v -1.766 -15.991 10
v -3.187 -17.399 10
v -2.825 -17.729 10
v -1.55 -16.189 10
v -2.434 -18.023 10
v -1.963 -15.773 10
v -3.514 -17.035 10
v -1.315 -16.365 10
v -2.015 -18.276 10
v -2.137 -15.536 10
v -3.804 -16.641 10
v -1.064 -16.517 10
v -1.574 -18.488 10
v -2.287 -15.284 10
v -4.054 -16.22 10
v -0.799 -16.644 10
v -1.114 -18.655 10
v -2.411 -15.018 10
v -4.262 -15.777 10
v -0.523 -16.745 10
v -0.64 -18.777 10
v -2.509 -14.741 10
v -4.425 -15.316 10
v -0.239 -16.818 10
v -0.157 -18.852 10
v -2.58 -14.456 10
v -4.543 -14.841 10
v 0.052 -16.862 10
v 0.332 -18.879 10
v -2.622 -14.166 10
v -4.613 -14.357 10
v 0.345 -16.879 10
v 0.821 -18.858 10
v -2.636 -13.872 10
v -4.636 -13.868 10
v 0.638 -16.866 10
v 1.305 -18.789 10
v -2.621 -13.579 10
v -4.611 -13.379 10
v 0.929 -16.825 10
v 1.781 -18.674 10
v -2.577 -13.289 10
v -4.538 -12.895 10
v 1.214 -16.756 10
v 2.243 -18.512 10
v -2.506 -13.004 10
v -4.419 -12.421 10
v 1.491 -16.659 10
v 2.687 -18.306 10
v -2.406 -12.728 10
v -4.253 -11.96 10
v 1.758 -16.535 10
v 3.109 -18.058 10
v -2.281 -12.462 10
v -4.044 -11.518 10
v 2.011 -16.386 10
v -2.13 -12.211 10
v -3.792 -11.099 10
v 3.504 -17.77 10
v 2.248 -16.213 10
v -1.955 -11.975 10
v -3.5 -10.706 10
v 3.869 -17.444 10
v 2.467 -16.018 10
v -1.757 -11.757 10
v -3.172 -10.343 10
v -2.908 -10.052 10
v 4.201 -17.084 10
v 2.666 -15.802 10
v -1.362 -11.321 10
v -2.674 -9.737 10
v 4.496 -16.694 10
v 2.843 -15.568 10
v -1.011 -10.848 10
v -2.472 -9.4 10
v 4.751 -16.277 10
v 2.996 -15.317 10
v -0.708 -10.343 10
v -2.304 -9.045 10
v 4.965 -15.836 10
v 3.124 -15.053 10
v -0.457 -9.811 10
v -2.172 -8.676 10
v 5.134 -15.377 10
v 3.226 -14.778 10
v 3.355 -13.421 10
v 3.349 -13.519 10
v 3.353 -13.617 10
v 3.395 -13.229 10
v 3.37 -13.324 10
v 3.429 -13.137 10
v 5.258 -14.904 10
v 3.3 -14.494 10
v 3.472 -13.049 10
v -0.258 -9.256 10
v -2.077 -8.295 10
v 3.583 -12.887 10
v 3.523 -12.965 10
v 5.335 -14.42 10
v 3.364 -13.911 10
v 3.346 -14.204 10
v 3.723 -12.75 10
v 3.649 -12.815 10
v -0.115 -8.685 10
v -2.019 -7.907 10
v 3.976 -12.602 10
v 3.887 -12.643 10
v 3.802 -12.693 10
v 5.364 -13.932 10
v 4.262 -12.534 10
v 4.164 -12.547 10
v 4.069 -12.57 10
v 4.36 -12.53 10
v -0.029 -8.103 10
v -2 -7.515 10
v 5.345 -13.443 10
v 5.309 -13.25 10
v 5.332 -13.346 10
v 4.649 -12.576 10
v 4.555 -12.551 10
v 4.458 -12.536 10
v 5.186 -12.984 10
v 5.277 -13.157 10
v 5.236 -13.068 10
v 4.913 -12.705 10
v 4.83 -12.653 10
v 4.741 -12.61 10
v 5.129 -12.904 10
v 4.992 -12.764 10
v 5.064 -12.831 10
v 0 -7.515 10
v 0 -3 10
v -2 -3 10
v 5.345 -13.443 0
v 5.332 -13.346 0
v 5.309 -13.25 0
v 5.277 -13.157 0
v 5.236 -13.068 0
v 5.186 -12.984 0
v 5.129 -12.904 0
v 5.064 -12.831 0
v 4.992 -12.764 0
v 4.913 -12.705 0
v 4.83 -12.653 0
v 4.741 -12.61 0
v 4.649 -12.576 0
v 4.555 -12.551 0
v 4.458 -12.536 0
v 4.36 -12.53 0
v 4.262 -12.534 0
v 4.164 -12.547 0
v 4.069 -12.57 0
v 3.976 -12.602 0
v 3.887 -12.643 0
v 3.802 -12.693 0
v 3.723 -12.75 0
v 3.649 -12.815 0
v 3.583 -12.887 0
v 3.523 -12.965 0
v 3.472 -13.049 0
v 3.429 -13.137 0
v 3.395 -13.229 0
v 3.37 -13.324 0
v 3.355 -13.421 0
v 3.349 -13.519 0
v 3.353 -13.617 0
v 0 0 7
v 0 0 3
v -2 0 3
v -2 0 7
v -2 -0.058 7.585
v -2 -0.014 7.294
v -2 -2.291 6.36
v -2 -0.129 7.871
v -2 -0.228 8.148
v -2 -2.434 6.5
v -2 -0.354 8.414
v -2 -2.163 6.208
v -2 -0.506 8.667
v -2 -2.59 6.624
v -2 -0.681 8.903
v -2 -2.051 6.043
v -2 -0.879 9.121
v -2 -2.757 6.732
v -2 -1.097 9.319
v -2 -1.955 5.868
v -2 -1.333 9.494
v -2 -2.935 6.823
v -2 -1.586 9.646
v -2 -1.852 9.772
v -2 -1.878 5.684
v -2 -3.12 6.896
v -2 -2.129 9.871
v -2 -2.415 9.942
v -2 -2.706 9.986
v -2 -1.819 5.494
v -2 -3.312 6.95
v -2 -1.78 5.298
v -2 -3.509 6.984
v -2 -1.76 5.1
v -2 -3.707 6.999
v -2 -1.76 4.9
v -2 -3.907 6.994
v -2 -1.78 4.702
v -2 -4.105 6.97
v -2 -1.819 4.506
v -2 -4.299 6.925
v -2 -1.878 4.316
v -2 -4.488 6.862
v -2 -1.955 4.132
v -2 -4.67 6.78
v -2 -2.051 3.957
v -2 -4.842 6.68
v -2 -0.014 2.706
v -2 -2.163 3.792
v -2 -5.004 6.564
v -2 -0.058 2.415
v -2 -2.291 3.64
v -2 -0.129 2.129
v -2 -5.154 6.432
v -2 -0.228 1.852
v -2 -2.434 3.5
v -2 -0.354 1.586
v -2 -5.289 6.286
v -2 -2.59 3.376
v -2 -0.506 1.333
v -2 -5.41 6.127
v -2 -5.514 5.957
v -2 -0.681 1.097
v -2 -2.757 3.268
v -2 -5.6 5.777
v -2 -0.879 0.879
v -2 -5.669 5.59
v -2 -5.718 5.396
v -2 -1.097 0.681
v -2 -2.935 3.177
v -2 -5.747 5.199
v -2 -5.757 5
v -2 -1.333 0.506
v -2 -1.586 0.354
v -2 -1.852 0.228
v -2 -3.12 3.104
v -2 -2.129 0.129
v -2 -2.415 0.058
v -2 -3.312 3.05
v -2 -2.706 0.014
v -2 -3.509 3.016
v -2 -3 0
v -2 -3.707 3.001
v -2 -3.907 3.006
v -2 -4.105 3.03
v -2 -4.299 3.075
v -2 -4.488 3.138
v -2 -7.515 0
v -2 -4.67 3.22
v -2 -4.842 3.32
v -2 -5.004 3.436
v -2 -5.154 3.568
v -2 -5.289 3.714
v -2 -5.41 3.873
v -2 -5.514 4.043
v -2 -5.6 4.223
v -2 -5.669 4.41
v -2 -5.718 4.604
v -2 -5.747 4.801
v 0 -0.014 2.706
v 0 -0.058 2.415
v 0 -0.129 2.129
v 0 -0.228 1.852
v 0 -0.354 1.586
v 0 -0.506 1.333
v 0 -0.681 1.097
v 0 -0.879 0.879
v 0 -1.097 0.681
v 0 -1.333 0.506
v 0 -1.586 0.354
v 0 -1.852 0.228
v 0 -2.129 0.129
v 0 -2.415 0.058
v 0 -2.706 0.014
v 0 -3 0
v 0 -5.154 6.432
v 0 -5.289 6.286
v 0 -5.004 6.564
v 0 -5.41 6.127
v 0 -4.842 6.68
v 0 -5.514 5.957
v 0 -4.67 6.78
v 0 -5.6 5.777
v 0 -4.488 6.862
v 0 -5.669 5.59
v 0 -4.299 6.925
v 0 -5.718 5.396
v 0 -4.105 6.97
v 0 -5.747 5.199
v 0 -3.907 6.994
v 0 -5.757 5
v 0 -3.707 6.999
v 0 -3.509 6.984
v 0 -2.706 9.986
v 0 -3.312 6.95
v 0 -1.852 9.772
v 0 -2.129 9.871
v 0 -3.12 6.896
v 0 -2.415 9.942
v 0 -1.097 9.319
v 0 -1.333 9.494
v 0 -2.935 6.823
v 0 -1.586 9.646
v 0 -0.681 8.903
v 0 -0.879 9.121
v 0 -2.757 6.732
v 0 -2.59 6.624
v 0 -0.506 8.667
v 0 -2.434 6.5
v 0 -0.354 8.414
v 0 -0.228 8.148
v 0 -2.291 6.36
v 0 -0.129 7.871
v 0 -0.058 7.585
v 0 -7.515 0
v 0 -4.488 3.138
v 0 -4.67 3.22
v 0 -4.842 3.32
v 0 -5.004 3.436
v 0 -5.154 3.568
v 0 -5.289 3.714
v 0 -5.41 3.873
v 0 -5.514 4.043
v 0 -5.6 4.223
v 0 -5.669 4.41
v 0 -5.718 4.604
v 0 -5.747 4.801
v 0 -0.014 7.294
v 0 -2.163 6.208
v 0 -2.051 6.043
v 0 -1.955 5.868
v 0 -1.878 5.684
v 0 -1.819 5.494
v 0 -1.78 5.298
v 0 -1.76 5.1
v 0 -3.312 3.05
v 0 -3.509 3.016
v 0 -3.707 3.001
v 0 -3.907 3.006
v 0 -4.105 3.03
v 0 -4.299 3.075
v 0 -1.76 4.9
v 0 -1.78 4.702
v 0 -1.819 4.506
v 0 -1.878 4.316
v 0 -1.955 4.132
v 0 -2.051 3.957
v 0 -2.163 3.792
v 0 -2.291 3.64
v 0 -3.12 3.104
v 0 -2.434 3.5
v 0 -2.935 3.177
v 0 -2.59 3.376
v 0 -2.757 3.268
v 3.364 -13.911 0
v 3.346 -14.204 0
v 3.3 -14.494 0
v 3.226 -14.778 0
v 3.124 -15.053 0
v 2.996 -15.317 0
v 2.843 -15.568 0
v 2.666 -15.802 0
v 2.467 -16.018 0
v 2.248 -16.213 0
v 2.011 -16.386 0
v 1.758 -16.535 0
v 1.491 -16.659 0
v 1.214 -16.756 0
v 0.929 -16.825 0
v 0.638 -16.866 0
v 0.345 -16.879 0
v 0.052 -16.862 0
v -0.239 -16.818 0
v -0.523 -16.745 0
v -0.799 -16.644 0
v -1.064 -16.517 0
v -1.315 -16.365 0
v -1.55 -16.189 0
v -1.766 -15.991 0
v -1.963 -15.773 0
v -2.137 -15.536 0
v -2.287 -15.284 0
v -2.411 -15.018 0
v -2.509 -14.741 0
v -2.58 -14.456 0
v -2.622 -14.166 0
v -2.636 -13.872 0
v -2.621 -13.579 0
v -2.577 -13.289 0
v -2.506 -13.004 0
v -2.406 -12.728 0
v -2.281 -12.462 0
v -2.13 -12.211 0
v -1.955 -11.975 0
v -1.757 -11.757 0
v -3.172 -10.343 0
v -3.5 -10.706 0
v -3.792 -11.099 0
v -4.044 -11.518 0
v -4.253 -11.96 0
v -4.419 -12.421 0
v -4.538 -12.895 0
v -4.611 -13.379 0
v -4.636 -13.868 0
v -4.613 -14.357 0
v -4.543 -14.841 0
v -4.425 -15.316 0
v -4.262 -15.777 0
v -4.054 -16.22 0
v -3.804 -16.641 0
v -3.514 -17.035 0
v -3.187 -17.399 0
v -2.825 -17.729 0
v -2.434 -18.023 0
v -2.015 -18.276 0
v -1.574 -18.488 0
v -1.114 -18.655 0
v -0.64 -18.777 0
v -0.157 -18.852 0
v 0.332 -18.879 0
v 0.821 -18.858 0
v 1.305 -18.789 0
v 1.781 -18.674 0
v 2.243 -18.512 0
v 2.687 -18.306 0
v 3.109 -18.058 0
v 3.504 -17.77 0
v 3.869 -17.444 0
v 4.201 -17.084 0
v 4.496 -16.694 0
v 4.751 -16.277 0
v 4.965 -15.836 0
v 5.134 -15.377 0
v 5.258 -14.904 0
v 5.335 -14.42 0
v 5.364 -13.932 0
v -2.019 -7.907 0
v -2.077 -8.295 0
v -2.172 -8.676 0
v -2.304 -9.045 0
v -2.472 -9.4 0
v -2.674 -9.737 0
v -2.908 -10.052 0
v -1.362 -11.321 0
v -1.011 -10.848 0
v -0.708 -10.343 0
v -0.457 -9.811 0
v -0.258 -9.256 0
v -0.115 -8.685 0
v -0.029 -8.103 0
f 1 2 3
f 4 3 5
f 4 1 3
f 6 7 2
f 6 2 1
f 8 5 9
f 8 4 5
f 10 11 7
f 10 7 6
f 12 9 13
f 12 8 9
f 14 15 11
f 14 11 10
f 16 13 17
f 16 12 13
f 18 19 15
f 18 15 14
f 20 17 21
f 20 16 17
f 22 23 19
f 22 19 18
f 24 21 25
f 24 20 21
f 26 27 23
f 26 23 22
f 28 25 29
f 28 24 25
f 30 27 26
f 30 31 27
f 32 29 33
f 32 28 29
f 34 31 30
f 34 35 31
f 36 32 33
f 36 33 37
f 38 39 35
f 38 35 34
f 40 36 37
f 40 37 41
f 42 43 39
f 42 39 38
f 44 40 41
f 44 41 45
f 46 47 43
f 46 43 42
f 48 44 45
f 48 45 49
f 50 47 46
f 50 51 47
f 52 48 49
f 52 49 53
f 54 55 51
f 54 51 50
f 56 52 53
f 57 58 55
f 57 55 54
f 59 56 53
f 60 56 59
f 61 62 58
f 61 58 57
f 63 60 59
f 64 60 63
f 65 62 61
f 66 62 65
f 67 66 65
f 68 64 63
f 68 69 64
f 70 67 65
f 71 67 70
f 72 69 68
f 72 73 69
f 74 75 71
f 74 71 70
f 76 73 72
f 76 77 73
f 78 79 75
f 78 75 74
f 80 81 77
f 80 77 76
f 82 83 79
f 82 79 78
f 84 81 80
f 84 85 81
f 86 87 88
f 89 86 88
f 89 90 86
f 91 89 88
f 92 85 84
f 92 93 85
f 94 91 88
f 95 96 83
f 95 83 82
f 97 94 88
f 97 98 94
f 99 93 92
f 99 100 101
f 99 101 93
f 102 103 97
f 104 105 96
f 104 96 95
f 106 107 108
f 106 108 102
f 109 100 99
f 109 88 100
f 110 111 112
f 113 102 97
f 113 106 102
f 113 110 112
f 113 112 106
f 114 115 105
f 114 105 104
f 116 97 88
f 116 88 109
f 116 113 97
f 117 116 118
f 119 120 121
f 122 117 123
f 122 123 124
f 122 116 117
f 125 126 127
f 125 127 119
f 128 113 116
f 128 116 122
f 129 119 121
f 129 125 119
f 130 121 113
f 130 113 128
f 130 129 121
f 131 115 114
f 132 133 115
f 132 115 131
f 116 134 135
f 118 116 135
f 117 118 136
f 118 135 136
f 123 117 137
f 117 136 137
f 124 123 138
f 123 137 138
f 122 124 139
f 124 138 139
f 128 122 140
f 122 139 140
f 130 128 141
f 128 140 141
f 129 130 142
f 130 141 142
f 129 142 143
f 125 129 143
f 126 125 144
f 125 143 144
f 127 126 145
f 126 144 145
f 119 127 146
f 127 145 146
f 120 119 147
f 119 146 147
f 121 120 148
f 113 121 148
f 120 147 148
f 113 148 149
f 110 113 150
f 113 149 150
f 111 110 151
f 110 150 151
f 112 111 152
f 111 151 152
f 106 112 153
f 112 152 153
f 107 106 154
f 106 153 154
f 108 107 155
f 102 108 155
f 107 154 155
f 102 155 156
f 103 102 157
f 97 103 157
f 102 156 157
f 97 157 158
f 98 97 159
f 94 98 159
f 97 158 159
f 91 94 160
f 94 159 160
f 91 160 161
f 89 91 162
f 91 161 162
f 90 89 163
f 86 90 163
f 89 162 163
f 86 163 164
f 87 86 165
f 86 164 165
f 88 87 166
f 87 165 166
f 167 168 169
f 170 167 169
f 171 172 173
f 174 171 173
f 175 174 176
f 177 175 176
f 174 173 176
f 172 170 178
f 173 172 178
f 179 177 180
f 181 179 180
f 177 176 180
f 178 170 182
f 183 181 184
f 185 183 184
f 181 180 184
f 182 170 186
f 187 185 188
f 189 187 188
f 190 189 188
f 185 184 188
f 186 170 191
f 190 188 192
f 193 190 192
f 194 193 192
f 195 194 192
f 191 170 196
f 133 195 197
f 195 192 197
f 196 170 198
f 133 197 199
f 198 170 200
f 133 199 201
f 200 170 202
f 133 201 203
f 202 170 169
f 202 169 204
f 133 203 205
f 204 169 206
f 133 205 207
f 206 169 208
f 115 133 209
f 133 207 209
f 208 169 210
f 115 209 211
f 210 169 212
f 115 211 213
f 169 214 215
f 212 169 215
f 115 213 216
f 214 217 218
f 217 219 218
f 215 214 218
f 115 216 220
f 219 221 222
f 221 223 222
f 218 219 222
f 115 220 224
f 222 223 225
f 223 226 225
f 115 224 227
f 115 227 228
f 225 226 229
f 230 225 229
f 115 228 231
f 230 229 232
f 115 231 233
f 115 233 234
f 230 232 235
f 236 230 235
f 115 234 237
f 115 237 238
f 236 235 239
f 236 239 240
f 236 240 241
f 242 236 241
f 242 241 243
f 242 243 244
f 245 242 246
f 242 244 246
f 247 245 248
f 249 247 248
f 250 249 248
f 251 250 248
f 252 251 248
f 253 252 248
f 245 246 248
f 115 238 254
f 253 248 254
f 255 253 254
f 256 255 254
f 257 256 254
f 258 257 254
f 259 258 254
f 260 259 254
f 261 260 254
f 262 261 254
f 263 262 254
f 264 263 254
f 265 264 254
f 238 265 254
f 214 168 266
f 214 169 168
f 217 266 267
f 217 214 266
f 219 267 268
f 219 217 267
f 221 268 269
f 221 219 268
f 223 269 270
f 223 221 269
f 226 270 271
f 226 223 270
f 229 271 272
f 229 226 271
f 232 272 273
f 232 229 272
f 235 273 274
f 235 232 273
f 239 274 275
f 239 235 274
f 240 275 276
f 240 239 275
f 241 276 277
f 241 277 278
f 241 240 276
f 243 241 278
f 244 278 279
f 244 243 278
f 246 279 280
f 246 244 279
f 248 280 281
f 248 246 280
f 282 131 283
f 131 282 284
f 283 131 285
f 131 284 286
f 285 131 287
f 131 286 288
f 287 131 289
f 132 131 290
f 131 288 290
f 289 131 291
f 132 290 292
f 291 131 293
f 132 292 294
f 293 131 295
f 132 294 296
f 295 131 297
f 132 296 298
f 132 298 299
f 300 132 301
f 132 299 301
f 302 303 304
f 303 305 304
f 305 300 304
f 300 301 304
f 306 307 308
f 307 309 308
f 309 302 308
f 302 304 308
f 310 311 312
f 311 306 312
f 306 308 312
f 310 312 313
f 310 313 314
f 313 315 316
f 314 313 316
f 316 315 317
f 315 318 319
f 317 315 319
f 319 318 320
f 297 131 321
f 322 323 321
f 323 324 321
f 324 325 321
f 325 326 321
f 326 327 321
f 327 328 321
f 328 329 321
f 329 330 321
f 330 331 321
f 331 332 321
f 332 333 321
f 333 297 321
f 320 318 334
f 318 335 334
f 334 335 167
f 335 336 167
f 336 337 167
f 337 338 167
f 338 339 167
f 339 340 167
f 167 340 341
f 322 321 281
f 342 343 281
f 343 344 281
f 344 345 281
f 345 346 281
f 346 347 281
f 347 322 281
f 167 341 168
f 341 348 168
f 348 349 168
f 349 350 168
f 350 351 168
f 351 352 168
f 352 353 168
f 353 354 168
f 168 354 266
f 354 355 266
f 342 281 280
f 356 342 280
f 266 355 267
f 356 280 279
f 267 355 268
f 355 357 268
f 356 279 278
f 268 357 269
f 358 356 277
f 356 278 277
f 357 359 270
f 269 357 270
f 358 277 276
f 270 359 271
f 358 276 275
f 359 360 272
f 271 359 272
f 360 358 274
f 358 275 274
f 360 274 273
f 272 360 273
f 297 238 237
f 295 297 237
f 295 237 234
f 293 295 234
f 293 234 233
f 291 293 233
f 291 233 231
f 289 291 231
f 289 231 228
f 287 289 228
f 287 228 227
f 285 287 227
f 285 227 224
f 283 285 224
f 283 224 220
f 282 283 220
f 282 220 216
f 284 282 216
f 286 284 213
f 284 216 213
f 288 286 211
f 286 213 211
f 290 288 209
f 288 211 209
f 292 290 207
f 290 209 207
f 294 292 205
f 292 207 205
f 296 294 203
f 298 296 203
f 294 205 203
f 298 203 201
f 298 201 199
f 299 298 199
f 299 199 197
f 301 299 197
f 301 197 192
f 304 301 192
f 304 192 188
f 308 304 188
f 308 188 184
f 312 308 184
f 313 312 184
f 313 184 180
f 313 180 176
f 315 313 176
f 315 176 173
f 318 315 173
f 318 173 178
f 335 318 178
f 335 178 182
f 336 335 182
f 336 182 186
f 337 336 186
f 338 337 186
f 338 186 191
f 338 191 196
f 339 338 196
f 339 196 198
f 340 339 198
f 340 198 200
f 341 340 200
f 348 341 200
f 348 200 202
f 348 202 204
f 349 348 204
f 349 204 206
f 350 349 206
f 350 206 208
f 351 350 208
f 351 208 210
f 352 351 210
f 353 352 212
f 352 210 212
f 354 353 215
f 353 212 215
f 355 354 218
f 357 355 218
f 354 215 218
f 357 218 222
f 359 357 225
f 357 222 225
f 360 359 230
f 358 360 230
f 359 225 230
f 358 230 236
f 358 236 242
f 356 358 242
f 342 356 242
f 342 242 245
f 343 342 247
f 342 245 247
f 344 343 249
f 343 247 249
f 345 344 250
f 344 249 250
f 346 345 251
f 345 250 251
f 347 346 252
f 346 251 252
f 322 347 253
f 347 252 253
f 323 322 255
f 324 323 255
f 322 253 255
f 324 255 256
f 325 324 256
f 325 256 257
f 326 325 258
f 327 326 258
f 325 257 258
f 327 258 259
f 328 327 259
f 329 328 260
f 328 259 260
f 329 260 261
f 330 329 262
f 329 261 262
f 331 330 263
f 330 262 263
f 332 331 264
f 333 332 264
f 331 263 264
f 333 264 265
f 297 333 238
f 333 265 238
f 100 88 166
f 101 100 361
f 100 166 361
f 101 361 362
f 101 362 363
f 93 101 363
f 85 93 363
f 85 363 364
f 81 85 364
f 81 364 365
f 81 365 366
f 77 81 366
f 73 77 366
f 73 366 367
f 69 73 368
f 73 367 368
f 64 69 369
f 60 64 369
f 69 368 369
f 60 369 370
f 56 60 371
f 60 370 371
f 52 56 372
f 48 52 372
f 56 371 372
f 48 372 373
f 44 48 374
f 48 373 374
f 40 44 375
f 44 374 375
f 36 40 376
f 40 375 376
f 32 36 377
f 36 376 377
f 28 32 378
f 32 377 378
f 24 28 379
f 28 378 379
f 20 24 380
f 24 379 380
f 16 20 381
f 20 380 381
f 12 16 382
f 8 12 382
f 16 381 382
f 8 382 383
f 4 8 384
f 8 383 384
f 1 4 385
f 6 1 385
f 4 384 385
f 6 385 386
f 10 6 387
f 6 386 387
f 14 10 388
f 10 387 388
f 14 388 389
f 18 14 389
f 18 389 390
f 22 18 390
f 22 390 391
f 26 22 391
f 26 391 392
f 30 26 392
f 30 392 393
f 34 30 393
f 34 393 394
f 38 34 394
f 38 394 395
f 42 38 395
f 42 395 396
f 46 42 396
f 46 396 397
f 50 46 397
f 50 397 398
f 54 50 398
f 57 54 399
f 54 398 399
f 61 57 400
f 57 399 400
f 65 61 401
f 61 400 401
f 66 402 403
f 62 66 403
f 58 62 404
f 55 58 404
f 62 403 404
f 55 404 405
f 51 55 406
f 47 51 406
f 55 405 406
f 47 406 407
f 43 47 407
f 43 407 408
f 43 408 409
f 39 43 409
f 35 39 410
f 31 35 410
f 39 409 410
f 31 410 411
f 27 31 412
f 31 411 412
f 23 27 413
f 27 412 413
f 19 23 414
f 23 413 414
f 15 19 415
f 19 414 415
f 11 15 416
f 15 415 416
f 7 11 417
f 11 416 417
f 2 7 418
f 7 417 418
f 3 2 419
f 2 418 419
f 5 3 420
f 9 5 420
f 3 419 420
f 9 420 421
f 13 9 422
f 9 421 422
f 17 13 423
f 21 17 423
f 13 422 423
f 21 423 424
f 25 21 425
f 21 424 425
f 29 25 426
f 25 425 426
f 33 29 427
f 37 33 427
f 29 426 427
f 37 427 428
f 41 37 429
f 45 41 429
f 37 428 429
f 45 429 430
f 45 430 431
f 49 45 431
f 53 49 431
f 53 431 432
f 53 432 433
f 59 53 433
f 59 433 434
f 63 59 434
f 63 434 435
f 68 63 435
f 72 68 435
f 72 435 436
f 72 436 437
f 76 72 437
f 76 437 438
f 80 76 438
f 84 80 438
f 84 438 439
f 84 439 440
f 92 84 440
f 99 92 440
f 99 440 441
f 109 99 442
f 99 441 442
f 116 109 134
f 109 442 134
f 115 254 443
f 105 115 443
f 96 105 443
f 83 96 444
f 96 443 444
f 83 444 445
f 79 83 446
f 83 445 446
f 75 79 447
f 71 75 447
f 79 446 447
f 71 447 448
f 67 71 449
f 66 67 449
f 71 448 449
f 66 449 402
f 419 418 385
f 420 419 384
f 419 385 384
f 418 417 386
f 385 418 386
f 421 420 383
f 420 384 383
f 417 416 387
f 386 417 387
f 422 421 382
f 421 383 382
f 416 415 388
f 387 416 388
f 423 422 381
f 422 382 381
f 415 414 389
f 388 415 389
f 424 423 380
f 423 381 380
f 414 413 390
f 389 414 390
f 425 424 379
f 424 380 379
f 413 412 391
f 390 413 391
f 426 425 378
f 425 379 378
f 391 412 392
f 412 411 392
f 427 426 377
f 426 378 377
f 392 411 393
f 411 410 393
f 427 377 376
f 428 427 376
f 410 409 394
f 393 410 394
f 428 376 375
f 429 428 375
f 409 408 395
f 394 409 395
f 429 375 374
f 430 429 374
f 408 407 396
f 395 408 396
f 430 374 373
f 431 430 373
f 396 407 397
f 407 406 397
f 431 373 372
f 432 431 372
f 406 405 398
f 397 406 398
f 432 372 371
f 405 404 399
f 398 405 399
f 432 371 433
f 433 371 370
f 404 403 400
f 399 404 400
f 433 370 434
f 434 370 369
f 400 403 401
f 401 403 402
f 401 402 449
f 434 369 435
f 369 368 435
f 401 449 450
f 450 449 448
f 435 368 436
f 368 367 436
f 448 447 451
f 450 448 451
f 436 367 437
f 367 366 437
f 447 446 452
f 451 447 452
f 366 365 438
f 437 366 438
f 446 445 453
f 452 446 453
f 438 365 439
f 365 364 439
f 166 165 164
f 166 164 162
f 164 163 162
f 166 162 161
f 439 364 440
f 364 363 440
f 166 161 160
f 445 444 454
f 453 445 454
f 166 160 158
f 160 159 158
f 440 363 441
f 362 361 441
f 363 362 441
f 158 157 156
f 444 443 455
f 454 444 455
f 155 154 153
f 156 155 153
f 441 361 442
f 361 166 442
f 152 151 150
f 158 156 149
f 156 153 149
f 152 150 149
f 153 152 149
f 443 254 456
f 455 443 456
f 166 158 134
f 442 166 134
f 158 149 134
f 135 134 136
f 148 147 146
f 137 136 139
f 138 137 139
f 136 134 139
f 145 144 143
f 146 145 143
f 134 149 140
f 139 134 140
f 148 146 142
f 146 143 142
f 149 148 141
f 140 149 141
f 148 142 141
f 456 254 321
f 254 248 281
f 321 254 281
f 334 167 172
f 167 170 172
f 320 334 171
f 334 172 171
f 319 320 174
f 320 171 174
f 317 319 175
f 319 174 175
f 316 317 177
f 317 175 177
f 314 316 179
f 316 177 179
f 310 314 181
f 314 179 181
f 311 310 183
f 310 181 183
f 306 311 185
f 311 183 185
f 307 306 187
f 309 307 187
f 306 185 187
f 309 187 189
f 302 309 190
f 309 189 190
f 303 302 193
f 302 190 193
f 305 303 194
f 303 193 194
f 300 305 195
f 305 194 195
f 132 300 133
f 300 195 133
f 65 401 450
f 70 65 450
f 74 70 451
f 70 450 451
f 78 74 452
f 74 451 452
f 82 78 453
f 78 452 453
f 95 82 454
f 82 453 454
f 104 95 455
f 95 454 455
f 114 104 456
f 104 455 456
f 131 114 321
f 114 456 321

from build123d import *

# Parameters (mm, degrees)
F1_DEPTH = 10
F2_R     = 3
F4_D     = 4


with BuildPart() as f1:
    # F0 (on Top) → F1 (new body)
    with BuildSketch(Plane.XY):
        with BuildLine():
            ThreePointArc((3.352545125, -13.6172124282), (-0.6620993993, -16.6977575188), (-1.7573593129, -11.7573593129))
            ThreePointArc((-1.7573593129, -11.7573593129), (-0.4567228049, -9.81081922), (0, -7.5147186258))
            Line((0, -7.5147186258), (0, 0))
            Line((0, 0), (-2, 0))
            Line((-2, 0), (-2, -7.5147186258))
            ThreePointArc((-2, -7.5147186258), (-2.30448187, -9.0454523552), (-3.1715728753, -10.3431457505))
            ThreePointArc((-3.1715728753, -10.3431457505), (-1.3461396859, -18.5771427604), (5.3449345211, -13.4429009427))
            ThreePointArc((5.3449345211, -13.4429009427), (4.2615840803, -12.5338619874), (3.352545125, -13.6172124282))
        make_face()
    extrude(amount=F1_DEPTH)

    # F2
    f2_edges = [f1.edges().sort_by_distance(p)[0] for p in [
        (-1, 0, 10),
        (-1, 0, 0),
    ]]
    fillet(f2_edges, radius=F2_R)

    # F4 (through all)
    with Locations(Plane.YZ):
        with Locations((-3.7573593129, 5)):
            Hole(F4_D / 2)


solid = f1.part
